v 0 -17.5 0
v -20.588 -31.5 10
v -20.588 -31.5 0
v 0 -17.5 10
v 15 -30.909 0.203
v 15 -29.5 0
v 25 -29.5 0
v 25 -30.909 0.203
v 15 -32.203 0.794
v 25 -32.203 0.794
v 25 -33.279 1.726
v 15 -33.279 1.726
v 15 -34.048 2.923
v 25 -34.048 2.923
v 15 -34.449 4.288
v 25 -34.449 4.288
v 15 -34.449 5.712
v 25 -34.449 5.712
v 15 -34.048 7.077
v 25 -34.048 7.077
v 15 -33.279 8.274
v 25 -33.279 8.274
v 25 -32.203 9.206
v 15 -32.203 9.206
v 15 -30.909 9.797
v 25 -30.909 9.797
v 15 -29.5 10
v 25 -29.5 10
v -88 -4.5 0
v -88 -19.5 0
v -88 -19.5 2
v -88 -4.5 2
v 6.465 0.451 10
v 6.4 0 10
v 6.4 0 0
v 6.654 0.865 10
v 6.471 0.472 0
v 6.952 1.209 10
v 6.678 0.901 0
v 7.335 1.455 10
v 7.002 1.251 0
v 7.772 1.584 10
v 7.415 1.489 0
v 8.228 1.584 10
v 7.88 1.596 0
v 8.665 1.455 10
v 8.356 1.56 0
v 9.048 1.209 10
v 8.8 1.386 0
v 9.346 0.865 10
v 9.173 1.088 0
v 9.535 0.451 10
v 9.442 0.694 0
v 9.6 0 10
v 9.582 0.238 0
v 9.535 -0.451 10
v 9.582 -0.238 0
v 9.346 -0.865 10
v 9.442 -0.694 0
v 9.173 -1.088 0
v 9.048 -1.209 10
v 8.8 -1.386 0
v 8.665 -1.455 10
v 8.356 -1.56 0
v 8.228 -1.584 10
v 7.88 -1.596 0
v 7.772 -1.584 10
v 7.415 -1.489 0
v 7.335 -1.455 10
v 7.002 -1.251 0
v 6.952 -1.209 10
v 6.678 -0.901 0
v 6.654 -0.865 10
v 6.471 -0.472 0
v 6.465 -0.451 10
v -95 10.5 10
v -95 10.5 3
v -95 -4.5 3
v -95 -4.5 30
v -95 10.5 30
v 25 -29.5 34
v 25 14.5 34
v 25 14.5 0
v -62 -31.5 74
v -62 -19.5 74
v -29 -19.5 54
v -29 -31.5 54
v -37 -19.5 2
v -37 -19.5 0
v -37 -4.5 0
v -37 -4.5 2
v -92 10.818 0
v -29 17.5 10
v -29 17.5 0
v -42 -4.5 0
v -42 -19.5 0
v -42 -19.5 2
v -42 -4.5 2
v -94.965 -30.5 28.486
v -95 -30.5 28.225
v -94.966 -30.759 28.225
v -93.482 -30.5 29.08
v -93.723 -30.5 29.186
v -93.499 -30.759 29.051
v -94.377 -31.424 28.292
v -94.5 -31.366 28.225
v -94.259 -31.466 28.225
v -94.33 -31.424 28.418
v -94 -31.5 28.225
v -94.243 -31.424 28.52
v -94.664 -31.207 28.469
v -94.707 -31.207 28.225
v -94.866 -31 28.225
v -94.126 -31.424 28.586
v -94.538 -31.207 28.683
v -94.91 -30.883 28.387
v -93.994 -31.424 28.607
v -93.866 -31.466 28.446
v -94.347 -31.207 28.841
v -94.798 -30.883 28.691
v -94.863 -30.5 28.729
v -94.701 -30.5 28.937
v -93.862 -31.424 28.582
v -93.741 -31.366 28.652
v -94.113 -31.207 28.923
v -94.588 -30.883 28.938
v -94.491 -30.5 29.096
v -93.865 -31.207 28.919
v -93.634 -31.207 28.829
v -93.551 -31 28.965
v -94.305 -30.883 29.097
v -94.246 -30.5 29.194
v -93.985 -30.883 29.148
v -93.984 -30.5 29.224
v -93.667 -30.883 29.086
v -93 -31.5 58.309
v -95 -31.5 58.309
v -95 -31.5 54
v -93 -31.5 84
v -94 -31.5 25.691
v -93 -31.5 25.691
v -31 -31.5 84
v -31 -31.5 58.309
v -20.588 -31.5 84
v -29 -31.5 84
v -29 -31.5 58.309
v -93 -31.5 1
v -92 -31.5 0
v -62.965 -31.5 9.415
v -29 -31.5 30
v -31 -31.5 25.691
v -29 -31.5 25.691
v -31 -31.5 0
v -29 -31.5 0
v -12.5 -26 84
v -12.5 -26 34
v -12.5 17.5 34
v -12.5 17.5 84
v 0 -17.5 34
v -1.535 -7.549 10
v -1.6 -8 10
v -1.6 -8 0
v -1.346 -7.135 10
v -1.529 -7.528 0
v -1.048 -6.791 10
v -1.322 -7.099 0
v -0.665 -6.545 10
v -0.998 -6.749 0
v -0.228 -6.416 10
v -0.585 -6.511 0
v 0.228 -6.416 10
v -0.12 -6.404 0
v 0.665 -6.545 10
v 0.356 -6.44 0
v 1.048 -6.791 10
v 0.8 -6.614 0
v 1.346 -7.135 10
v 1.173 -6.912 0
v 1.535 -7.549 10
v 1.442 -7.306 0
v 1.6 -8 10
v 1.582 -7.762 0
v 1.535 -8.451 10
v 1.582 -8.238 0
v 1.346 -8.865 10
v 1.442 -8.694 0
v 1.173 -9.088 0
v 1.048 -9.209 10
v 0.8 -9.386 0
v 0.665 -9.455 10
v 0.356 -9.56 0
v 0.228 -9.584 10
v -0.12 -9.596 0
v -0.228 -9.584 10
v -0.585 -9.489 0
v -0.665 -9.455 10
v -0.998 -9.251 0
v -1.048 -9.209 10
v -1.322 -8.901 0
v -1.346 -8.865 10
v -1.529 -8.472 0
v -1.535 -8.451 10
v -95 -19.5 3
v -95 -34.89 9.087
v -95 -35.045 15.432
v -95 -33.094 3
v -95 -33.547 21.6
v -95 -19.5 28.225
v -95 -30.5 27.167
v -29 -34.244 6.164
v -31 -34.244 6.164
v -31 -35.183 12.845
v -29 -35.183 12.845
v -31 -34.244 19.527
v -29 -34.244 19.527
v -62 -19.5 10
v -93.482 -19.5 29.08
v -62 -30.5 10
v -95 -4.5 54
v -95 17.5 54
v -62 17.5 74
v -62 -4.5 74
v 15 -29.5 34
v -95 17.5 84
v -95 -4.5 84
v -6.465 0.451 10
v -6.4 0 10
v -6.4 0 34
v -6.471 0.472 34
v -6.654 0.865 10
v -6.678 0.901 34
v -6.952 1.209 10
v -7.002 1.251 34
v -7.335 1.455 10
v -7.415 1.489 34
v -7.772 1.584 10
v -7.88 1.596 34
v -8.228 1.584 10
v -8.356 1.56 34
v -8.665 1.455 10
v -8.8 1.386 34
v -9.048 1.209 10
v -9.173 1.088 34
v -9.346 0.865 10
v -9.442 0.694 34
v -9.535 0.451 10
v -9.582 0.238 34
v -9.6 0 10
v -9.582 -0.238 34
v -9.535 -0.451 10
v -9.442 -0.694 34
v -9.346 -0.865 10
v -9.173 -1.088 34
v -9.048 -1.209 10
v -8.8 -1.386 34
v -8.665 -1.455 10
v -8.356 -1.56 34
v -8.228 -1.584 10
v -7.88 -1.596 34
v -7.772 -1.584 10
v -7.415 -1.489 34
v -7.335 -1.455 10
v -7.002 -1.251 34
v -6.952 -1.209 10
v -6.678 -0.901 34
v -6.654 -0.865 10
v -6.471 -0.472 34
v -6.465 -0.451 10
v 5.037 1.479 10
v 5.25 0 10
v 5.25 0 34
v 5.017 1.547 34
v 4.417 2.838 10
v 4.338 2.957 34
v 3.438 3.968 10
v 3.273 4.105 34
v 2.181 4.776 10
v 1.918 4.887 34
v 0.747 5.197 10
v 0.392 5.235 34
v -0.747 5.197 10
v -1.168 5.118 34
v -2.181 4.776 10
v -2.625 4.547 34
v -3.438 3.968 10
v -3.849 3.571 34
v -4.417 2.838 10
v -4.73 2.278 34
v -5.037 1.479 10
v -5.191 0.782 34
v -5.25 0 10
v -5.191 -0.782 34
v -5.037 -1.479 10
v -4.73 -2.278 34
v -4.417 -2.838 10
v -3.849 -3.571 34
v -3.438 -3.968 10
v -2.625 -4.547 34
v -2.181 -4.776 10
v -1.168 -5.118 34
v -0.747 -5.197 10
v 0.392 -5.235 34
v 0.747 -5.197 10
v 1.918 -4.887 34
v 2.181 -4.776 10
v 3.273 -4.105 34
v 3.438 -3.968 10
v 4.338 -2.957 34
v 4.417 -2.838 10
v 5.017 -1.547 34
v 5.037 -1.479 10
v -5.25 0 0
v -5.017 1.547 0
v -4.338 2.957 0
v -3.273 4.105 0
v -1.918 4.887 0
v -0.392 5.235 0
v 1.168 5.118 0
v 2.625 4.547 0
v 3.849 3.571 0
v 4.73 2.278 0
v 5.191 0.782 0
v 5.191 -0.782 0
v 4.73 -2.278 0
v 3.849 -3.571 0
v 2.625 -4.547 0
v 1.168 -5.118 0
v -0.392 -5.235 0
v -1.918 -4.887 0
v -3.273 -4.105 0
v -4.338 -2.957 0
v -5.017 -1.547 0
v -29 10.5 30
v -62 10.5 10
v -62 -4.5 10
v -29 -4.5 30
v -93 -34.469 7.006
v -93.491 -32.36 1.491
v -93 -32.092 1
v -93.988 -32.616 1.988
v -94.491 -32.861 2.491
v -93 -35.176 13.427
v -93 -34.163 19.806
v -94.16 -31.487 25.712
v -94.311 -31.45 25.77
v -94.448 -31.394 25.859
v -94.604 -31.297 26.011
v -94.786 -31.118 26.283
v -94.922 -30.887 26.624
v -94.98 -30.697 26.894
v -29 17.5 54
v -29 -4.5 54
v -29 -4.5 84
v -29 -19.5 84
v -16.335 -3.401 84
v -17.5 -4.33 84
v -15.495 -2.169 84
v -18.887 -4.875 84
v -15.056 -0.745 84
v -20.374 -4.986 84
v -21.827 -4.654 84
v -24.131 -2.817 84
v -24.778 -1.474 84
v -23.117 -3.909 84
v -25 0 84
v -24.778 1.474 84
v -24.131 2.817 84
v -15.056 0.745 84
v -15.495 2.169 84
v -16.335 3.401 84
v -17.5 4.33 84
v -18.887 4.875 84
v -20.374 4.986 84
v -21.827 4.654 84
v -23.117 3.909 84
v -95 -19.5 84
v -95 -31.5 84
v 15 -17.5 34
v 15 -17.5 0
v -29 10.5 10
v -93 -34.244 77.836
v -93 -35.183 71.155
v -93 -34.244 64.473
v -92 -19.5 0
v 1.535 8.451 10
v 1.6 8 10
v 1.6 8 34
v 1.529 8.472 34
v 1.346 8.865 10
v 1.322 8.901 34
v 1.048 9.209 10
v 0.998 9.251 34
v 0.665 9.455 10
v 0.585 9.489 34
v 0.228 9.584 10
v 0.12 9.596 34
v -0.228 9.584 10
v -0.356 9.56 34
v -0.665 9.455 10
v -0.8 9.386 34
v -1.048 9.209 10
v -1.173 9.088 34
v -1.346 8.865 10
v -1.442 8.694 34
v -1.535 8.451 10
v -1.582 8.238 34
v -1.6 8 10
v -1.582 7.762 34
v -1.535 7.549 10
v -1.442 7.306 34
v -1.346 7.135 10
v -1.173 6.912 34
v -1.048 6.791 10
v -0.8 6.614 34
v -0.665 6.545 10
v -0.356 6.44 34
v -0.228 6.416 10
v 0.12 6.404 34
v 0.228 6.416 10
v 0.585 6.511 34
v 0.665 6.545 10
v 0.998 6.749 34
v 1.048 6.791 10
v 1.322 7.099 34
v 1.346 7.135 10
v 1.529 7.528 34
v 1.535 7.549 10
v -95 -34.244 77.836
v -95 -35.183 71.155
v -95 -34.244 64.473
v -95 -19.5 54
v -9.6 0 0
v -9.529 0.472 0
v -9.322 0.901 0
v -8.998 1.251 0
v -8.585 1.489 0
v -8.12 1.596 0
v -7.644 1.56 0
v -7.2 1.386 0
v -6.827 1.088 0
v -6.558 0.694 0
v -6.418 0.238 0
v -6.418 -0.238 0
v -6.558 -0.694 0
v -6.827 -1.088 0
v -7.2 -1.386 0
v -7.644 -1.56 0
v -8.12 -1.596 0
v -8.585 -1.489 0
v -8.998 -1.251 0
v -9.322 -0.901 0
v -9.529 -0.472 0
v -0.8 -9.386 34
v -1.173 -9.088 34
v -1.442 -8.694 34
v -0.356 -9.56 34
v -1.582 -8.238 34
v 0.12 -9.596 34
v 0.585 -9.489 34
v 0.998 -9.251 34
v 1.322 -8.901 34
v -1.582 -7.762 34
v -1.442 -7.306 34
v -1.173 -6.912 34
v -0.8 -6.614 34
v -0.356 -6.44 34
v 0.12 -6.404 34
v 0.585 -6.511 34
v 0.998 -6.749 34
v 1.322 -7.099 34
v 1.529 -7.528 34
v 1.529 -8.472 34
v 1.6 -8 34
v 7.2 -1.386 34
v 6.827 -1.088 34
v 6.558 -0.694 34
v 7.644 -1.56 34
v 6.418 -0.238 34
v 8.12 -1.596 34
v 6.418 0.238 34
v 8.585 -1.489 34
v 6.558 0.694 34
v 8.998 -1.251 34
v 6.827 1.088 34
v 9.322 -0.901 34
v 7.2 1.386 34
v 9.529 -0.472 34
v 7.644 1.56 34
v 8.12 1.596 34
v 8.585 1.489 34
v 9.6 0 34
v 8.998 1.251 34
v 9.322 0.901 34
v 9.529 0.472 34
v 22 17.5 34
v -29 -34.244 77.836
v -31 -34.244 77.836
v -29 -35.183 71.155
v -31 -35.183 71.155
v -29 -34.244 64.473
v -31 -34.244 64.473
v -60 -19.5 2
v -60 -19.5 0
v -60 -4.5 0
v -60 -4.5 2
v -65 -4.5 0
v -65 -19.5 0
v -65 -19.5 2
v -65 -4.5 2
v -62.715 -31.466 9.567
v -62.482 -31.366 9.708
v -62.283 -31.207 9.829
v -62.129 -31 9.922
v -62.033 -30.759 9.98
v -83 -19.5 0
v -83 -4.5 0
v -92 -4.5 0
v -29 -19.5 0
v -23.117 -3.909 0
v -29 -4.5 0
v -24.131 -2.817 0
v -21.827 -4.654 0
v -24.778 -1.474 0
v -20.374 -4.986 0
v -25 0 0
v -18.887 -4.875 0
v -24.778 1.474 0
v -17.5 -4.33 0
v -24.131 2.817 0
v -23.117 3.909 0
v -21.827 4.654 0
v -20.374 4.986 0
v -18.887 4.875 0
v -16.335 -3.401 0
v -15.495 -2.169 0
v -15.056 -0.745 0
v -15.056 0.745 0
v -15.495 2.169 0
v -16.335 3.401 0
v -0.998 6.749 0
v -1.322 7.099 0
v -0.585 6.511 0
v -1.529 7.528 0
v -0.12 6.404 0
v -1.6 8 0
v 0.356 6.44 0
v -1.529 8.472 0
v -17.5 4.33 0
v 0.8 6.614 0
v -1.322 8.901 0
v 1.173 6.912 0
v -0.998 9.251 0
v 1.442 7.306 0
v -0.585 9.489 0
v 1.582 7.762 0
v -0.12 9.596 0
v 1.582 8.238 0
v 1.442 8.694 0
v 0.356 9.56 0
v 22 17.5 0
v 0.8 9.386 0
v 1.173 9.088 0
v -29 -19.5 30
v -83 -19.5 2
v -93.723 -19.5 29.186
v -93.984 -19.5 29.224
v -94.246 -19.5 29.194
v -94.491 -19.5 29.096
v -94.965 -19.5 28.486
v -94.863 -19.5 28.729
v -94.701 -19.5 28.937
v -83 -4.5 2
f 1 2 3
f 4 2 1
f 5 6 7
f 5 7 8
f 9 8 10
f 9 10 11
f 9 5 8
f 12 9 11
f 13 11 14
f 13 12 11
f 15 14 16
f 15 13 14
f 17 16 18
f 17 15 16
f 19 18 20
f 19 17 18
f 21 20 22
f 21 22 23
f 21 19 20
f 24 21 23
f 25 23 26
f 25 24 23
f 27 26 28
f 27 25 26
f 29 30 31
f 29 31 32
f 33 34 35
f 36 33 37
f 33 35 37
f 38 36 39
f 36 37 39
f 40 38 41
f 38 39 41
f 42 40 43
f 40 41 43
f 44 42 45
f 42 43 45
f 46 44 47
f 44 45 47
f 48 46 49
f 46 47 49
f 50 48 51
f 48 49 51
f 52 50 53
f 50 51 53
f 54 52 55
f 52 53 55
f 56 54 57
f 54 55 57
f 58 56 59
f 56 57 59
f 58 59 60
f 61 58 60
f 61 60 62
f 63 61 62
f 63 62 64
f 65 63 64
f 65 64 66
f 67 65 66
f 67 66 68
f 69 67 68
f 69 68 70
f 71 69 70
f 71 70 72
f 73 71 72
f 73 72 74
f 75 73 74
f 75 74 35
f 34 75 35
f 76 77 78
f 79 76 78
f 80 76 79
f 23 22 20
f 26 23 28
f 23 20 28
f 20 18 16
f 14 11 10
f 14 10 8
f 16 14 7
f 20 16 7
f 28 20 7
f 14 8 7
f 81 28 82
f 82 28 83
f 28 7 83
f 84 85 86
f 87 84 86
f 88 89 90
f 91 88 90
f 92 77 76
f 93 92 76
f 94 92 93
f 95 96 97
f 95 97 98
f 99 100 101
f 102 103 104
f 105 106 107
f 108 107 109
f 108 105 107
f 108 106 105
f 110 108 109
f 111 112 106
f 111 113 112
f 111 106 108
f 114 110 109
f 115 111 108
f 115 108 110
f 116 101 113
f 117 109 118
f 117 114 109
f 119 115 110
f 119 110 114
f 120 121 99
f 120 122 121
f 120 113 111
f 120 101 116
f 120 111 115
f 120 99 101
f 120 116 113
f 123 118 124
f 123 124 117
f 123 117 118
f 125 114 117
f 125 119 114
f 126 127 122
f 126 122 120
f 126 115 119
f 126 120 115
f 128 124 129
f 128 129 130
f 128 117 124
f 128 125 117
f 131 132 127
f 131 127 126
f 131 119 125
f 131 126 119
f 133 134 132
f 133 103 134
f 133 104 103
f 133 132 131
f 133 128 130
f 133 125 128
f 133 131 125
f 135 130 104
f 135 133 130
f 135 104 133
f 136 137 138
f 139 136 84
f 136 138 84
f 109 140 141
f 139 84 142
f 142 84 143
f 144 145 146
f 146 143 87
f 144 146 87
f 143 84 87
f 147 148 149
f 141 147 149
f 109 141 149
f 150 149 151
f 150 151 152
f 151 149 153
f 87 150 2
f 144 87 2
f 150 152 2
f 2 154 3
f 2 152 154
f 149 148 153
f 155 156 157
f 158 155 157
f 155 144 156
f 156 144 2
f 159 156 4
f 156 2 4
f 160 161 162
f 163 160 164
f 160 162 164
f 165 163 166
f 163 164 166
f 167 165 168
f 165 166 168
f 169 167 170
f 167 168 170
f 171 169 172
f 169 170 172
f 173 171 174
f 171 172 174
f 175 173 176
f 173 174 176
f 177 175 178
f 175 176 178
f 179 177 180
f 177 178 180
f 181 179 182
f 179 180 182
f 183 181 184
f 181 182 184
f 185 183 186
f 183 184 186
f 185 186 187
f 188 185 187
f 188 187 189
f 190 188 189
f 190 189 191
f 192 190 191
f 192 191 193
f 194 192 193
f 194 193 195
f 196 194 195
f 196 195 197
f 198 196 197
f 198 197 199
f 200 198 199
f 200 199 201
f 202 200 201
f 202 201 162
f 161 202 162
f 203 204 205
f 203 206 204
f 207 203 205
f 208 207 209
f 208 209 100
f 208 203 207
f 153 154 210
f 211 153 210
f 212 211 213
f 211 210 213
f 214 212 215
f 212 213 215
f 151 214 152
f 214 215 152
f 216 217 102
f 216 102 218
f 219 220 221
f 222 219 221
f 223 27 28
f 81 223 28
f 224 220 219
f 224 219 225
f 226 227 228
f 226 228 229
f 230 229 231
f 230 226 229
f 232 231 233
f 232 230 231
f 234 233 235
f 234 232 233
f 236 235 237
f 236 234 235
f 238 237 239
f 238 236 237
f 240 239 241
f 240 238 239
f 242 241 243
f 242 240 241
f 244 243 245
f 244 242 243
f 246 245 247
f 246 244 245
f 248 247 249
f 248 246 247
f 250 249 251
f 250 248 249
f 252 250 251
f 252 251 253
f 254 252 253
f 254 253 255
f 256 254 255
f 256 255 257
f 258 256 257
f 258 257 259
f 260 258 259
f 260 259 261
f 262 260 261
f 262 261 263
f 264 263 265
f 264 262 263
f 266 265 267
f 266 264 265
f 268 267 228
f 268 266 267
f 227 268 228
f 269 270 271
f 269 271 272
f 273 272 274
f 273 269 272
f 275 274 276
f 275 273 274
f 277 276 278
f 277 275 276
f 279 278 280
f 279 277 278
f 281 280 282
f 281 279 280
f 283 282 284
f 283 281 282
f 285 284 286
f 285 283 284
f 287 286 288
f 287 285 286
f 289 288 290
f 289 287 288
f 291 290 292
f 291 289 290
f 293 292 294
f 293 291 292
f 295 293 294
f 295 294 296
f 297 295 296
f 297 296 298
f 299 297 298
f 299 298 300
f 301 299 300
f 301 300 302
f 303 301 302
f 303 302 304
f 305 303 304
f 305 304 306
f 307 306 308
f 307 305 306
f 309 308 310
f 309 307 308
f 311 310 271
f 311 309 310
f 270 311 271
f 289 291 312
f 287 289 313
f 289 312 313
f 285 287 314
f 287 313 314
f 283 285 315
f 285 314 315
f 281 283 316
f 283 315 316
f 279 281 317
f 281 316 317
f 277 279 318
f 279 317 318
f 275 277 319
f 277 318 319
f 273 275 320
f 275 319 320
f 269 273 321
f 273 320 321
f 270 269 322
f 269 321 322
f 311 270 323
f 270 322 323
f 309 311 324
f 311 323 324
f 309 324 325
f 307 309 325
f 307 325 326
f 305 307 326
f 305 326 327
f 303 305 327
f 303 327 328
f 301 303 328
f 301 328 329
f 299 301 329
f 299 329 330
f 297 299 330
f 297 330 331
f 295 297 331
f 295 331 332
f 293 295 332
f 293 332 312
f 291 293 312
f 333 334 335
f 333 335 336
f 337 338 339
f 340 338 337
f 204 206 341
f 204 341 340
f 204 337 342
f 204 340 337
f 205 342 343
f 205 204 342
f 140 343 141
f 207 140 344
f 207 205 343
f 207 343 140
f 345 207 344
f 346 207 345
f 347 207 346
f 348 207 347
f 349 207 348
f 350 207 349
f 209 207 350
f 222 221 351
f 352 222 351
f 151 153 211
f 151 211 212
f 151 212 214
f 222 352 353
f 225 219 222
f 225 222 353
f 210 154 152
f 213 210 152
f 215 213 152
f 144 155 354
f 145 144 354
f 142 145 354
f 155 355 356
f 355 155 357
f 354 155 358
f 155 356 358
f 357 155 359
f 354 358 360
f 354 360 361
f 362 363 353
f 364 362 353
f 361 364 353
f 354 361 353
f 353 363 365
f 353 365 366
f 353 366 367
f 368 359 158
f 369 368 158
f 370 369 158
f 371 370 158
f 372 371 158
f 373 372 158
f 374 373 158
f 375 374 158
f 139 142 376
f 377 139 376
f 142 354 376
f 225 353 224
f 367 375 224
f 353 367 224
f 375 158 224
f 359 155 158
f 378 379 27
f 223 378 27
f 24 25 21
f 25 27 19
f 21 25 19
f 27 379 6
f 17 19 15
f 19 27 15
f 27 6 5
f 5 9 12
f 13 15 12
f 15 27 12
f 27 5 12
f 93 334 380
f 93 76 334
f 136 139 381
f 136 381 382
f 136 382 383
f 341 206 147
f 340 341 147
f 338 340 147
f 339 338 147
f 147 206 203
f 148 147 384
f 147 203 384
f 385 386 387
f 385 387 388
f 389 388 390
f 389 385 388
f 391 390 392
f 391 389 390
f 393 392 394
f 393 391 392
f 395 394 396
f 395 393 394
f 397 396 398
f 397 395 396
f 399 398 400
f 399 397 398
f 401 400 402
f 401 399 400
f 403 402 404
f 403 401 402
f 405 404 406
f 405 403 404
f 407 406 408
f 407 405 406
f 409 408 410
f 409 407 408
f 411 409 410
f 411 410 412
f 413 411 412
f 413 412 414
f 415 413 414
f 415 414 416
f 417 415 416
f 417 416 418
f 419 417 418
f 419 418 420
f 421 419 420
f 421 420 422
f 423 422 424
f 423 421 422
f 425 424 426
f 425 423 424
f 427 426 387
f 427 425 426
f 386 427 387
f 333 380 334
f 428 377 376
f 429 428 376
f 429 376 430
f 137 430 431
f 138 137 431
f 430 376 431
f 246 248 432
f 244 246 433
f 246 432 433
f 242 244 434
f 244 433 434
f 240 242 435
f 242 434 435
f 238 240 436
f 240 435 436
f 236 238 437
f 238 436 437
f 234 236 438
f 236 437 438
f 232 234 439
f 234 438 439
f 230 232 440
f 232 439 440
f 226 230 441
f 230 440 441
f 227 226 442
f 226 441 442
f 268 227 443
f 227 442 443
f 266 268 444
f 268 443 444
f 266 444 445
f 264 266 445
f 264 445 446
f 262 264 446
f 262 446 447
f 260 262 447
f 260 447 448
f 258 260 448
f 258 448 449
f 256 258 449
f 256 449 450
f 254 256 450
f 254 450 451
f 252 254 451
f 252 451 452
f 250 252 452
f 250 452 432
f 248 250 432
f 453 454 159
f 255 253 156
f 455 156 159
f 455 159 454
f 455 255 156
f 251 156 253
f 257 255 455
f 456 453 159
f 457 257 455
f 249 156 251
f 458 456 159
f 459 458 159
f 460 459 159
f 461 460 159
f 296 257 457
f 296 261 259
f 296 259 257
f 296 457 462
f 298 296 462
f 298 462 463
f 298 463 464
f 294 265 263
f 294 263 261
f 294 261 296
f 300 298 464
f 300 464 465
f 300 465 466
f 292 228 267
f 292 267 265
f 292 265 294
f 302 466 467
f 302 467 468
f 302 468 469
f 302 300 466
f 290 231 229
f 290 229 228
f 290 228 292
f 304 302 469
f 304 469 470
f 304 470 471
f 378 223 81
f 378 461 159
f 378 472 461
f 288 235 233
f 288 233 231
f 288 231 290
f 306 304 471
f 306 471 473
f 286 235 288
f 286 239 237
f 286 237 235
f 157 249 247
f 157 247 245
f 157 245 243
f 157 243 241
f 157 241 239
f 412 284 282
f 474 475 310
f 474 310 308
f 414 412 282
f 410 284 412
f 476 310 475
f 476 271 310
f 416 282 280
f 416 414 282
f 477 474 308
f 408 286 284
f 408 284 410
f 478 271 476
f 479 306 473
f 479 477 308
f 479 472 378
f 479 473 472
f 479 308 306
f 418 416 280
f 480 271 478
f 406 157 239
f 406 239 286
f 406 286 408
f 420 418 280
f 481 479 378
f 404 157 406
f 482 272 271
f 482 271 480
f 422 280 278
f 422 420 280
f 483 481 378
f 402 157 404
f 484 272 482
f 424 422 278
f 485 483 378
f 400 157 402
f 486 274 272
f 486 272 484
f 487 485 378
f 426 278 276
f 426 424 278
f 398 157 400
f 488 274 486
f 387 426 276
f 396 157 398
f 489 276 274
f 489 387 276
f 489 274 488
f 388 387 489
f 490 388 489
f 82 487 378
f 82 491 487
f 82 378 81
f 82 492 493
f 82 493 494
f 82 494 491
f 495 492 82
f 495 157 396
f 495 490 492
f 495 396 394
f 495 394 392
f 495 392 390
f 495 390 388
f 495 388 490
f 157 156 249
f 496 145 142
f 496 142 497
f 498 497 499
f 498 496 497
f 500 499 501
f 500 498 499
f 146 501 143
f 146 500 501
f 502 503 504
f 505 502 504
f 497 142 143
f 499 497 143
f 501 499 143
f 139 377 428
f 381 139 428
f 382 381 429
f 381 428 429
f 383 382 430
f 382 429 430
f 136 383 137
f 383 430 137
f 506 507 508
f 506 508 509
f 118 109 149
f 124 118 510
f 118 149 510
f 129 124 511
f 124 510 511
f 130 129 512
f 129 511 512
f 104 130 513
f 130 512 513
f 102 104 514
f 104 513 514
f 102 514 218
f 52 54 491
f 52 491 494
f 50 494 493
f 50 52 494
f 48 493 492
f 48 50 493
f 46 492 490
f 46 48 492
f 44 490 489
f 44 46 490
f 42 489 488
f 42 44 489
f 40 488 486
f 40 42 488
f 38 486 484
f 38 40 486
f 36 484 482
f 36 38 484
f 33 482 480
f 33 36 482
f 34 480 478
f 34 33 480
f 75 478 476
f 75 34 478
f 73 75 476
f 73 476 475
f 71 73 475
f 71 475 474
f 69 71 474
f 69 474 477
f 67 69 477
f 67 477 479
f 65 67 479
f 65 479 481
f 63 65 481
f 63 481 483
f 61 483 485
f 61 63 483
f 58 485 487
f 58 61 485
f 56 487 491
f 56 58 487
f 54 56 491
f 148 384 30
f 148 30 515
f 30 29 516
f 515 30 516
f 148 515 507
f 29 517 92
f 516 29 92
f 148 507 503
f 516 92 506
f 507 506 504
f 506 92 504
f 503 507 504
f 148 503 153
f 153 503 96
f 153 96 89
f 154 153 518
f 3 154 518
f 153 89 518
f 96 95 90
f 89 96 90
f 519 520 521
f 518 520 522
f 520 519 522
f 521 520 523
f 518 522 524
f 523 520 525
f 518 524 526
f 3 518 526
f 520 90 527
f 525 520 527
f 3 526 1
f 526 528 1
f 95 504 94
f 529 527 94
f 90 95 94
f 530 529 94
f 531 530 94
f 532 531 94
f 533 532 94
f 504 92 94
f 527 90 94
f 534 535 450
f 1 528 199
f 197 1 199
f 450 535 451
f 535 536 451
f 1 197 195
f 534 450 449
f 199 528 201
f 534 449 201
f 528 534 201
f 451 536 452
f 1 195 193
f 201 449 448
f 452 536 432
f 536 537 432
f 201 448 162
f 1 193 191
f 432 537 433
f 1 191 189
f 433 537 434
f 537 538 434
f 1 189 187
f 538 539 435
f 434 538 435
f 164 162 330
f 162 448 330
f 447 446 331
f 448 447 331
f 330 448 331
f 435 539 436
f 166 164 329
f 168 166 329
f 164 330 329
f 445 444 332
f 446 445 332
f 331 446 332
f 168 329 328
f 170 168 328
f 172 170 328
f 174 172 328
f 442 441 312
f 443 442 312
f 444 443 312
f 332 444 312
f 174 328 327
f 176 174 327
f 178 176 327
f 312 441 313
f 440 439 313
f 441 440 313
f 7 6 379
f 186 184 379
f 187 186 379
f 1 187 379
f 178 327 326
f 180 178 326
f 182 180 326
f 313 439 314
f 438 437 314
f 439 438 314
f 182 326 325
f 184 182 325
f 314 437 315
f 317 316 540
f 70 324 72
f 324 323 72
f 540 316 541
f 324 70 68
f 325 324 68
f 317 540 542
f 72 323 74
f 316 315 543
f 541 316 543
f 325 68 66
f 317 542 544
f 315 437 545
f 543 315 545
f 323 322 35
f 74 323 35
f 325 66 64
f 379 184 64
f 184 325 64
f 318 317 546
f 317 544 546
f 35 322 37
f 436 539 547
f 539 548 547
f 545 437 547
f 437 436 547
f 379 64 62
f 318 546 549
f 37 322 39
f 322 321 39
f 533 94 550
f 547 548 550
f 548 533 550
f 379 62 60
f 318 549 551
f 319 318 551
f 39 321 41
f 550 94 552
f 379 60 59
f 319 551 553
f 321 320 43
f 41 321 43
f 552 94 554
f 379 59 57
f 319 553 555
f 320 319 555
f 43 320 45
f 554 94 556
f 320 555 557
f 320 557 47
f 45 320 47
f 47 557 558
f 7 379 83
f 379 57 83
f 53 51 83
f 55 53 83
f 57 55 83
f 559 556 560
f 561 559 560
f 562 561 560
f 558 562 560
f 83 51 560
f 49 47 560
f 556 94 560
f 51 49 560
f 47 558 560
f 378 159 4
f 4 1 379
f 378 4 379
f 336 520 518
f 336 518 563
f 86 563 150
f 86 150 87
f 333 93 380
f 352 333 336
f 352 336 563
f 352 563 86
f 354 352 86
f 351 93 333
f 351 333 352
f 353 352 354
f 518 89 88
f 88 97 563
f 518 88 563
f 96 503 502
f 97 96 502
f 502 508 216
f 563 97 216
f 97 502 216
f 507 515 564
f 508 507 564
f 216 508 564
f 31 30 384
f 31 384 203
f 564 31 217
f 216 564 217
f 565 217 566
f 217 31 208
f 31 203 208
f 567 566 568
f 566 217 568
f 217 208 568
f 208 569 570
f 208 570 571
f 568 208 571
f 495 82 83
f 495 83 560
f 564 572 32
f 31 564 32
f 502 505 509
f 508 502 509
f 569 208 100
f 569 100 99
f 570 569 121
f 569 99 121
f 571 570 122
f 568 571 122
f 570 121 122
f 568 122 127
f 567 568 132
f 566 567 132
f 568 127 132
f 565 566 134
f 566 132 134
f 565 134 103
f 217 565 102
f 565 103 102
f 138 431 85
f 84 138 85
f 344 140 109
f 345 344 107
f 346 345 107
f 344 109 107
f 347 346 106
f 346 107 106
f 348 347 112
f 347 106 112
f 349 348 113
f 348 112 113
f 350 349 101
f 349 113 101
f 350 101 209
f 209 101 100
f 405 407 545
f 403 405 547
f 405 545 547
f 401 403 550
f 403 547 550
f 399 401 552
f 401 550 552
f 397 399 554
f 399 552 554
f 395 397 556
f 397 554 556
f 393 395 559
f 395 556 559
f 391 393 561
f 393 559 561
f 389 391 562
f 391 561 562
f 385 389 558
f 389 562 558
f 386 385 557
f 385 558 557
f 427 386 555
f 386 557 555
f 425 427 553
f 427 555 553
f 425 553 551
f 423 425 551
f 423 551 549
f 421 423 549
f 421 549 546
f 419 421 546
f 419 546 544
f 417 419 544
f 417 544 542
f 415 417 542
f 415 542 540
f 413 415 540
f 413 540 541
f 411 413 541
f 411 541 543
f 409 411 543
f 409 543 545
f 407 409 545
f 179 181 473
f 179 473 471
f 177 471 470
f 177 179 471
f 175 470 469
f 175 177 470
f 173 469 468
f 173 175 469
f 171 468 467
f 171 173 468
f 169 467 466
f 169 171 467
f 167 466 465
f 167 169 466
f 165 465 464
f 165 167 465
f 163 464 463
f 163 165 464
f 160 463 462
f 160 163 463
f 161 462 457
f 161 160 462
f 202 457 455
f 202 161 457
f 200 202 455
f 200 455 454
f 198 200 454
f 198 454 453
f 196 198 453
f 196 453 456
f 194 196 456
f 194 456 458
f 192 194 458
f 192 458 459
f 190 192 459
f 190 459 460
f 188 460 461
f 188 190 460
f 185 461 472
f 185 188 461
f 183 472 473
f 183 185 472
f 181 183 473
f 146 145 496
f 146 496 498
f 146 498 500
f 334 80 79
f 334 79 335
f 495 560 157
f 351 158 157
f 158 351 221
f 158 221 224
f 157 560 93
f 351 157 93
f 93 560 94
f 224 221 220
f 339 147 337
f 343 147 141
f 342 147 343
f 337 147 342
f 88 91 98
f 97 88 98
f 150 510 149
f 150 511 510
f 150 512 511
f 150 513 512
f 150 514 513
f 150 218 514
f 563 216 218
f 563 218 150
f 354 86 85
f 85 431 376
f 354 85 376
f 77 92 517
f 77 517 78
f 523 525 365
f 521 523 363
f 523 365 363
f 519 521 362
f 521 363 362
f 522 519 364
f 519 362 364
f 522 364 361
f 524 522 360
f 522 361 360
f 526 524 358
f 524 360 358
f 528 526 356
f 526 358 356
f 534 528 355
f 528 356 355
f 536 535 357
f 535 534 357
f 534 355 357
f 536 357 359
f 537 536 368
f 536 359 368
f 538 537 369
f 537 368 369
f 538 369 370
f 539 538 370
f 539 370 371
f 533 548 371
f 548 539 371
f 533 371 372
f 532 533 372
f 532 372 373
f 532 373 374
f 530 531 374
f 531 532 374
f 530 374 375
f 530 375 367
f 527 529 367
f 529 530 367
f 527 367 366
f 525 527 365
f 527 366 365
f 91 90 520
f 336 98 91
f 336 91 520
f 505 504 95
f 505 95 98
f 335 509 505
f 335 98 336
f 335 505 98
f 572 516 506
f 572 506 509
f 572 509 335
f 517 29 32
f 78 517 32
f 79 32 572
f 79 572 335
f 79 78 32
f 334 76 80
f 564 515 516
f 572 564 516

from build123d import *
from build123d.topology import SkipClean

# Parameters (mm, degrees)
SKETCH_1_W            = 50
SKETCH_1_H            = 35
EXTRUDE_1_DEPTH       = 10
HOLE_WIZARD_370_D     = 10.5
HOLE_WIZARD_475_D     = 3.2
SKETCH_6_W            = 10
SKETCH_6_H            = 52
EXTRUDE_2_DEPTH       = 70
EXTRUDE_3_DEPTH       = 52
SKETCH_10_W           = 30
SKETCH_10_H           = 15
SKETCH_10_H_2         = 7
CUT_EXTRUDE_1_DEPTH   = 66
SKETCH_12_W           = 5
SKETCH_12_H           = 15
EXTRUDE_4_DEPTH       = 2
EXTRUDE_5_DEPTH       = 10
RIB_6_REACH           = 107.429
SKETCH_15_WALL_W      = 243.090204886
SKETCH_15_WALL_H      = 10
SKETCH_16_W           = 10
SKETCH_16_H           = 10
EXTRUDE_6_DEPTH       = 17
FILLET_1_RADIUS       = 5
FILLET_1_LENGTH       = 10
CUT_EXTRUDE_3_DEPTH   = 3
EXTRUDE_8_DEPTH       = 2
FILLET_3_R            = 1
SKETCH_20_R           = 5
CUT_EXTRUDE_4_DEPTH   = 106.654483654
CHAMFER_3_SIZE        = 3
SKETCH_22_R           = 1.6
SKETCH_22_R_2         = 4.65
SKETCH_22_R_3         = 5.25
EXTRUDE_9_DEPTH       = 74
EXTRUDE_10_DEPTH      = 49
SKETCH_25_W           = 30
SKETCH_25_H           = 15
CUT_EXTRUDE_5_DEPTH   = 66
SKETCH_26_R           = 12.5
CUT_EXTRUDE_6_DEPTH   = 50
SKETCH_27_W           = 25
SKETCH_27_H           = 70.37051412
SKETCH_27_W_2         = 27.110275364
CUT_EXTRUDE_7_DEPTH   = 50
SKETCH_28_R           = 5
CUT_EXTRUDE_8_DEPTH   = 132.601177488
MIRROR_2_COPY_1_DEPTH = 2


with BuildPart() as part:
    # 草图1 → 凸台-拉伸1 (new body)
    with BuildSketch(Plane.XY):
        Rectangle(SKETCH_1_W, SKETCH_1_H)
    extrude(amount=EXTRUDE_1_DEPTH)

    # Hole Wizard 370 (through all)
    with Locations(Plane.XY.offset(10)):
        with Locations((0, 0)):
            Hole(HOLE_WIZARD_370_D / 2)

    # Hole Wizard 475 (through all)
    with Locations(Plane.XY.offset(10)):
        with Locations((8, 0), (0, 8), (-8, 0), (0, -8)):
            Hole(HOLE_WIZARD_475_D / 2)

    # 草图6 → 凸台-拉伸2 (add)
    with BuildSketch(Plane.ZY.offset(25)):
        with Locations((5, -8.5)):
            Rectangle(SKETCH_6_W, SKETCH_6_H)
    extrude(amount=EXTRUDE_2_DEPTH)

    # 草图9 → 凸台-拉伸3 (add, through all)
    with BuildSketch(Plane(origin=(0, 17.5, 0), x_dir=(1, 0, 0), z_dir=(0, 1, 0))):
        Polygon((-95, -30), (-62, -10), (-95, -10), align=None)
        Polygon((-29, -30), (-29, -10), (-62, -10), align=None)
    extrude(amount=-EXTRUDE_3_DEPTH)

    # 草图10 → 切除-拉伸1 (cut)
    with BuildSketch(Plane.ZY.offset(95)):
        with Locations((15, -12)):
            Rectangle(SKETCH_10_W, SKETCH_10_H)
        with Locations((15, 14)):
            Rectangle(SKETCH_10_W, SKETCH_10_H_2)
    extrude(amount=-CUT_EXTRUDE_1_DEPTH, mode=Mode.SUBTRACT)

    # 草图12 → 凸台-拉伸4 (add)
    with BuildSketch(Plane(origin=(0, 0, 0), x_dir=(-1, 0, 0), z_dir=(0, 0, -1))):
        with Locations((85.5, -12)):
            Rectangle(SKETCH_12_W, SKETCH_12_H)
        with Locations((39.5, -12)):
            Rectangle(SKETCH_12_W, SKETCH_12_H)
        with Locations((62.5, -12)):
            Rectangle(SKETCH_12_W, SKETCH_12_H)
    extrude(amount=-EXTRUDE_4_DEPTH)

    # 草图14 → 凸台-拉伸5 (add)
    with BuildSketch(Plane(origin=(0, 0, 0), x_dir=(-1, 0, 0), z_dir=(0, 0, -1))):
        Polygon((95, 10.5), (29, 17.5), (29, 10.5), align=None)
    extrude(amount=-EXTRUDE_5_DEPTH)

    # 草图15 wall → 筋6 (add, up to next)
    with BuildSketch(Plane(origin=(-12.5, -26, 0), x_dir=(0.82692650207, 0.562310021407, 0), z_dir=(0.562310021407, -0.82692650207, 0)), mode=Mode.PRIVATE) as rib_6_sk1:
        with Locations((0, 5)):
            Rectangle(SKETCH_15_WALL_W, SKETCH_15_WALL_H)
    rib_6_tool1 = extrude(rib_6_sk1.sketch, amount=-RIB_6_REACH, mode=Mode.PRIVATE) - part.part
    add(rib_6_tool1.solids().sort_by_distance((-12.5, -26, 0))[0])

    # 草图16 → 凸台-拉伸6 (add)
    with BuildSketch(Plane.XZ.offset(17.5)):
        with Locations((20, 5)):
            Rectangle(SKETCH_16_W, SKETCH_16_H)
    extrude(amount=EXTRUDE_6_DEPTH)

    # 圆角1: full round fillet: the end face becomes a half cylinder, R = half its width
    fillet_1_face = Plane((20, -34.5, 5), x_dir=(-1, 0, 0), z_dir=(0, -1, 0))  # on the end face: x along it, z out of the body
    fillet_1_slab = fillet_1_face.offset(-FILLET_1_RADIUS / 2) * Box(FILLET_1_LENGTH, 2 * FILLET_1_RADIUS, FILLET_1_RADIUS, mode=Mode.PRIVATE)  # the body's end, R deep
    fillet_1_round = Plane((20, -29.5, 5), x_dir=(0, -1, 0), z_dir=(-1, 0, 0)) * Cylinder(FILLET_1_RADIUS, FILLET_1_LENGTH, mode=Mode.PRIVATE)  # its axis R under the face
    add(fillet_1_slab - fillet_1_round, mode=Mode.SUBTRACT)

    # 草图17 → 切除-拉伸3 (cut)
    with BuildSketch(Plane.XZ.offset(34.5)):
        Polygon((-95, 30), (-62, 10), (-29, 30), (-29, 10), (-17.881583213, 10), (-17.881583213, 0), (-29, 0), (-95, 0), align=None)
    extrude(amount=-CUT_EXTRUDE_3_DEPTH, mode=Mode.SUBTRACT)

    # 草图19 → 凸台-拉伸8 (add)
    with BuildSketch(Plane.ZY.offset(95)):
        with BuildLine():
            Line((25.690911714, -31.5), (0, -31.5))
            ThreePointArc((0, -31.5), (12.845455857, -35.183375195), (25.690911714, -31.5))
        make_face()
    extrude_8 = extrude(amount=-EXTRUDE_8_DEPTH)

    # 圆角3
    fillet_3_edges = [part.edges().sort_by_distance(p)[0] for p in [
        (-95, -25.5, 30),
        (-95, -31.5, 27.845455857),
        (-78.5, -31.5, 20),
    ]]
    fillet(fillet_3_edges, radius=FILLET_3_R)

    # 草图20 → 切除-拉伸4 (cut, through all)
    with BuildSketch(Plane(origin=(0, 0, 0), x_dir=(-1, 0, 0), z_dir=(0, 0, -1))):
        with Locations((20, 0)):
            Circle(SKETCH_20_R)
    extrude(amount=-CUT_EXTRUDE_4_DEPTH, mode=Mode.SUBTRACT)

    # 倒角3
    # the kernel refuses this chamfer: 3 mm, written as the material it takes off along each edge
    with BuildSketch(Plane(origin=(25, 17.5, -7.715048964), x_dir=(0.02749587661058678, -0.9996219169112968, 0), z_dir=(0, 0, 1))) as chamfer_3_piece_1:
        Polygon((CHAMFER_3_SIZE * 0.999621916911, -CHAMFER_3_SIZE * 0.0274958766106), (-CHAMFER_3_SIZE * 0.0274958766106, -CHAMFER_3_SIZE * 0.999621916911), (0, 0), align=None)
    extrude(amount=25.430097928, mode=Mode.SUBTRACT)
    with BuildSketch(Plane(origin=(-95, 18.215048964, 0), x_dir=(0.9996219169112968, 0, -0.02749587661058636), z_dir=(0, -1, 0))) as chamfer_3_piece_2:
        Polygon((CHAMFER_3_SIZE * 0.999621916911, CHAMFER_3_SIZE * 0.0274958766106), (-CHAMFER_3_SIZE * 0.0274958766106, CHAMFER_3_SIZE * 0.999621916911), (0, 0), align=None)
    extrude(amount=30.430097928, mode=Mode.SUBTRACT)
    with BuildSketch(Plane(origin=(-95, -11.784951036, 0), x_dir=(-0.027495876610586778, 0, 0.9996219169112968), z_dir=(0, -1, 0))) as chamfer_3_piece_3:
        Polygon((CHAMFER_3_SIZE * 0.999621916911, -CHAMFER_3_SIZE * 0.0274958766106), (-CHAMFER_3_SIZE * 0.0274958766106, -CHAMFER_3_SIZE * 0.999621916911), (0, 0), align=None)
    extrude(amount=27.430097928, mode=Mode.SUBTRACT)

    # 草图22 → 凸台-拉伸9 (add)
    with SkipClean():  # the faces are left unmerged after this step: merging them gives an invalid solid
        with BuildSketch(Plane.XY.offset(10)):
            Polygon((-29, 17.5), (-29, -31.5), (-20.588235294, -31.5), (0, -17.5), (15, -17.5), (15, -29.5), (25, -29.5), (25, 14.5), (22, 17.5), align=None)
            with Locations((0, -8)):
                Circle(SKETCH_22_R, mode=Mode.SUBTRACT)
            with Locations((0, 8)):
                Circle(SKETCH_22_R, mode=Mode.SUBTRACT)
            with Locations((8, 0)):
                Circle(SKETCH_22_R, mode=Mode.SUBTRACT)
            with Locations((-8, 0)):
                Circle(SKETCH_22_R, mode=Mode.SUBTRACT)
            with Locations((-20, 0)):
                Circle(SKETCH_22_R_2, mode=Mode.SUBTRACT)
            Circle(SKETCH_22_R_3, mode=Mode.SUBTRACT)
        extrude(amount=EXTRUDE_9_DEPTH)
    add(part.part.scale(1), mode=Mode.REPLACE)  # the faces are merged on a copy

    # 草图24 → 凸台-拉伸10 (add)
    with SkipClean():  # the faces are left unmerged after this step: merging them gives an invalid solid
        with BuildSketch(Plane(origin=(0, 17.5, 0), x_dir=(1, 0, 0), z_dir=(0, 1, 0))):
            Polygon((-95, -74), (-95, -54), (-62, -74), (-29, -54), (-29, -74), (-29, -84), (-95, -84), align=None)
        extrude(amount=-EXTRUDE_10_DEPTH)

    # 草图25 → 切除-拉伸5 (cut)
    with SkipClean():  # the faces are left unmerged after this step: merging them gives an invalid solid
        with BuildSketch(Plane.ZY.offset(95)):
            with Locations((69, -12)):
                Rectangle(SKETCH_25_W, SKETCH_25_H)
        extrude(amount=-CUT_EXTRUDE_5_DEPTH, mode=Mode.SUBTRACT)

    # 草图26 → 切除-拉伸6 (cut)
    with BuildSketch(Plane.XY.offset(84)):
        Circle(SKETCH_26_R)
    extrude(amount=-CUT_EXTRUDE_6_DEPTH, mode=Mode.SUBTRACT)

    # 草图27 → 切除-拉伸7 (cut)
    with BuildSketch(Plane.XY.offset(84)):
        Rectangle(SKETCH_27_W, SKETCH_27_H)
        with Locations((26.055137682, 0)):
            Rectangle(SKETCH_27_W_2, SKETCH_27_H)
    extrude(amount=-CUT_EXTRUDE_7_DEPTH, mode=Mode.SUBTRACT)

    # 镜向1: 凸台-拉伸8 across plane
    add(extrude_8.mirror(Plane(origin=(0, 0, 42), x_dir=(1, 0, 0), z_dir=(0, 0, -1))))

    # 草图28 → 切除-拉伸8 (cut, through all)
    with BuildSketch(Plane.XY.offset(84)):
        with Locations(Location((-20, 0, 0), (0, 0, 180))):
            Circle(SKETCH_28_R)
    extrude(amount=-CUT_EXTRUDE_8_DEPTH, mode=Mode.SUBTRACT)

    # 镜向2: 凸台-拉伸8 across plane
    add(extrude_8.mirror(Plane.ZY.offset(62)))

    # 镜向2 copy 1 sketch → 镜向2 copy 1 (add)
    with BuildSketch(Plane(origin=(-29, 0, 84), x_dir=(0, 0, -1), z_dir=(1, 0, 0))):
        with BuildLine():
            Line((25.690911714, -31.5), (0, -31.5))
            ThreePointArc((0, -31.5), (12.845455857, -35.183375195), (25.690911714, -31.5))
        make_face()
    extrude(amount=-MIRROR_2_COPY_1_DEPTH)


solid = part.part
